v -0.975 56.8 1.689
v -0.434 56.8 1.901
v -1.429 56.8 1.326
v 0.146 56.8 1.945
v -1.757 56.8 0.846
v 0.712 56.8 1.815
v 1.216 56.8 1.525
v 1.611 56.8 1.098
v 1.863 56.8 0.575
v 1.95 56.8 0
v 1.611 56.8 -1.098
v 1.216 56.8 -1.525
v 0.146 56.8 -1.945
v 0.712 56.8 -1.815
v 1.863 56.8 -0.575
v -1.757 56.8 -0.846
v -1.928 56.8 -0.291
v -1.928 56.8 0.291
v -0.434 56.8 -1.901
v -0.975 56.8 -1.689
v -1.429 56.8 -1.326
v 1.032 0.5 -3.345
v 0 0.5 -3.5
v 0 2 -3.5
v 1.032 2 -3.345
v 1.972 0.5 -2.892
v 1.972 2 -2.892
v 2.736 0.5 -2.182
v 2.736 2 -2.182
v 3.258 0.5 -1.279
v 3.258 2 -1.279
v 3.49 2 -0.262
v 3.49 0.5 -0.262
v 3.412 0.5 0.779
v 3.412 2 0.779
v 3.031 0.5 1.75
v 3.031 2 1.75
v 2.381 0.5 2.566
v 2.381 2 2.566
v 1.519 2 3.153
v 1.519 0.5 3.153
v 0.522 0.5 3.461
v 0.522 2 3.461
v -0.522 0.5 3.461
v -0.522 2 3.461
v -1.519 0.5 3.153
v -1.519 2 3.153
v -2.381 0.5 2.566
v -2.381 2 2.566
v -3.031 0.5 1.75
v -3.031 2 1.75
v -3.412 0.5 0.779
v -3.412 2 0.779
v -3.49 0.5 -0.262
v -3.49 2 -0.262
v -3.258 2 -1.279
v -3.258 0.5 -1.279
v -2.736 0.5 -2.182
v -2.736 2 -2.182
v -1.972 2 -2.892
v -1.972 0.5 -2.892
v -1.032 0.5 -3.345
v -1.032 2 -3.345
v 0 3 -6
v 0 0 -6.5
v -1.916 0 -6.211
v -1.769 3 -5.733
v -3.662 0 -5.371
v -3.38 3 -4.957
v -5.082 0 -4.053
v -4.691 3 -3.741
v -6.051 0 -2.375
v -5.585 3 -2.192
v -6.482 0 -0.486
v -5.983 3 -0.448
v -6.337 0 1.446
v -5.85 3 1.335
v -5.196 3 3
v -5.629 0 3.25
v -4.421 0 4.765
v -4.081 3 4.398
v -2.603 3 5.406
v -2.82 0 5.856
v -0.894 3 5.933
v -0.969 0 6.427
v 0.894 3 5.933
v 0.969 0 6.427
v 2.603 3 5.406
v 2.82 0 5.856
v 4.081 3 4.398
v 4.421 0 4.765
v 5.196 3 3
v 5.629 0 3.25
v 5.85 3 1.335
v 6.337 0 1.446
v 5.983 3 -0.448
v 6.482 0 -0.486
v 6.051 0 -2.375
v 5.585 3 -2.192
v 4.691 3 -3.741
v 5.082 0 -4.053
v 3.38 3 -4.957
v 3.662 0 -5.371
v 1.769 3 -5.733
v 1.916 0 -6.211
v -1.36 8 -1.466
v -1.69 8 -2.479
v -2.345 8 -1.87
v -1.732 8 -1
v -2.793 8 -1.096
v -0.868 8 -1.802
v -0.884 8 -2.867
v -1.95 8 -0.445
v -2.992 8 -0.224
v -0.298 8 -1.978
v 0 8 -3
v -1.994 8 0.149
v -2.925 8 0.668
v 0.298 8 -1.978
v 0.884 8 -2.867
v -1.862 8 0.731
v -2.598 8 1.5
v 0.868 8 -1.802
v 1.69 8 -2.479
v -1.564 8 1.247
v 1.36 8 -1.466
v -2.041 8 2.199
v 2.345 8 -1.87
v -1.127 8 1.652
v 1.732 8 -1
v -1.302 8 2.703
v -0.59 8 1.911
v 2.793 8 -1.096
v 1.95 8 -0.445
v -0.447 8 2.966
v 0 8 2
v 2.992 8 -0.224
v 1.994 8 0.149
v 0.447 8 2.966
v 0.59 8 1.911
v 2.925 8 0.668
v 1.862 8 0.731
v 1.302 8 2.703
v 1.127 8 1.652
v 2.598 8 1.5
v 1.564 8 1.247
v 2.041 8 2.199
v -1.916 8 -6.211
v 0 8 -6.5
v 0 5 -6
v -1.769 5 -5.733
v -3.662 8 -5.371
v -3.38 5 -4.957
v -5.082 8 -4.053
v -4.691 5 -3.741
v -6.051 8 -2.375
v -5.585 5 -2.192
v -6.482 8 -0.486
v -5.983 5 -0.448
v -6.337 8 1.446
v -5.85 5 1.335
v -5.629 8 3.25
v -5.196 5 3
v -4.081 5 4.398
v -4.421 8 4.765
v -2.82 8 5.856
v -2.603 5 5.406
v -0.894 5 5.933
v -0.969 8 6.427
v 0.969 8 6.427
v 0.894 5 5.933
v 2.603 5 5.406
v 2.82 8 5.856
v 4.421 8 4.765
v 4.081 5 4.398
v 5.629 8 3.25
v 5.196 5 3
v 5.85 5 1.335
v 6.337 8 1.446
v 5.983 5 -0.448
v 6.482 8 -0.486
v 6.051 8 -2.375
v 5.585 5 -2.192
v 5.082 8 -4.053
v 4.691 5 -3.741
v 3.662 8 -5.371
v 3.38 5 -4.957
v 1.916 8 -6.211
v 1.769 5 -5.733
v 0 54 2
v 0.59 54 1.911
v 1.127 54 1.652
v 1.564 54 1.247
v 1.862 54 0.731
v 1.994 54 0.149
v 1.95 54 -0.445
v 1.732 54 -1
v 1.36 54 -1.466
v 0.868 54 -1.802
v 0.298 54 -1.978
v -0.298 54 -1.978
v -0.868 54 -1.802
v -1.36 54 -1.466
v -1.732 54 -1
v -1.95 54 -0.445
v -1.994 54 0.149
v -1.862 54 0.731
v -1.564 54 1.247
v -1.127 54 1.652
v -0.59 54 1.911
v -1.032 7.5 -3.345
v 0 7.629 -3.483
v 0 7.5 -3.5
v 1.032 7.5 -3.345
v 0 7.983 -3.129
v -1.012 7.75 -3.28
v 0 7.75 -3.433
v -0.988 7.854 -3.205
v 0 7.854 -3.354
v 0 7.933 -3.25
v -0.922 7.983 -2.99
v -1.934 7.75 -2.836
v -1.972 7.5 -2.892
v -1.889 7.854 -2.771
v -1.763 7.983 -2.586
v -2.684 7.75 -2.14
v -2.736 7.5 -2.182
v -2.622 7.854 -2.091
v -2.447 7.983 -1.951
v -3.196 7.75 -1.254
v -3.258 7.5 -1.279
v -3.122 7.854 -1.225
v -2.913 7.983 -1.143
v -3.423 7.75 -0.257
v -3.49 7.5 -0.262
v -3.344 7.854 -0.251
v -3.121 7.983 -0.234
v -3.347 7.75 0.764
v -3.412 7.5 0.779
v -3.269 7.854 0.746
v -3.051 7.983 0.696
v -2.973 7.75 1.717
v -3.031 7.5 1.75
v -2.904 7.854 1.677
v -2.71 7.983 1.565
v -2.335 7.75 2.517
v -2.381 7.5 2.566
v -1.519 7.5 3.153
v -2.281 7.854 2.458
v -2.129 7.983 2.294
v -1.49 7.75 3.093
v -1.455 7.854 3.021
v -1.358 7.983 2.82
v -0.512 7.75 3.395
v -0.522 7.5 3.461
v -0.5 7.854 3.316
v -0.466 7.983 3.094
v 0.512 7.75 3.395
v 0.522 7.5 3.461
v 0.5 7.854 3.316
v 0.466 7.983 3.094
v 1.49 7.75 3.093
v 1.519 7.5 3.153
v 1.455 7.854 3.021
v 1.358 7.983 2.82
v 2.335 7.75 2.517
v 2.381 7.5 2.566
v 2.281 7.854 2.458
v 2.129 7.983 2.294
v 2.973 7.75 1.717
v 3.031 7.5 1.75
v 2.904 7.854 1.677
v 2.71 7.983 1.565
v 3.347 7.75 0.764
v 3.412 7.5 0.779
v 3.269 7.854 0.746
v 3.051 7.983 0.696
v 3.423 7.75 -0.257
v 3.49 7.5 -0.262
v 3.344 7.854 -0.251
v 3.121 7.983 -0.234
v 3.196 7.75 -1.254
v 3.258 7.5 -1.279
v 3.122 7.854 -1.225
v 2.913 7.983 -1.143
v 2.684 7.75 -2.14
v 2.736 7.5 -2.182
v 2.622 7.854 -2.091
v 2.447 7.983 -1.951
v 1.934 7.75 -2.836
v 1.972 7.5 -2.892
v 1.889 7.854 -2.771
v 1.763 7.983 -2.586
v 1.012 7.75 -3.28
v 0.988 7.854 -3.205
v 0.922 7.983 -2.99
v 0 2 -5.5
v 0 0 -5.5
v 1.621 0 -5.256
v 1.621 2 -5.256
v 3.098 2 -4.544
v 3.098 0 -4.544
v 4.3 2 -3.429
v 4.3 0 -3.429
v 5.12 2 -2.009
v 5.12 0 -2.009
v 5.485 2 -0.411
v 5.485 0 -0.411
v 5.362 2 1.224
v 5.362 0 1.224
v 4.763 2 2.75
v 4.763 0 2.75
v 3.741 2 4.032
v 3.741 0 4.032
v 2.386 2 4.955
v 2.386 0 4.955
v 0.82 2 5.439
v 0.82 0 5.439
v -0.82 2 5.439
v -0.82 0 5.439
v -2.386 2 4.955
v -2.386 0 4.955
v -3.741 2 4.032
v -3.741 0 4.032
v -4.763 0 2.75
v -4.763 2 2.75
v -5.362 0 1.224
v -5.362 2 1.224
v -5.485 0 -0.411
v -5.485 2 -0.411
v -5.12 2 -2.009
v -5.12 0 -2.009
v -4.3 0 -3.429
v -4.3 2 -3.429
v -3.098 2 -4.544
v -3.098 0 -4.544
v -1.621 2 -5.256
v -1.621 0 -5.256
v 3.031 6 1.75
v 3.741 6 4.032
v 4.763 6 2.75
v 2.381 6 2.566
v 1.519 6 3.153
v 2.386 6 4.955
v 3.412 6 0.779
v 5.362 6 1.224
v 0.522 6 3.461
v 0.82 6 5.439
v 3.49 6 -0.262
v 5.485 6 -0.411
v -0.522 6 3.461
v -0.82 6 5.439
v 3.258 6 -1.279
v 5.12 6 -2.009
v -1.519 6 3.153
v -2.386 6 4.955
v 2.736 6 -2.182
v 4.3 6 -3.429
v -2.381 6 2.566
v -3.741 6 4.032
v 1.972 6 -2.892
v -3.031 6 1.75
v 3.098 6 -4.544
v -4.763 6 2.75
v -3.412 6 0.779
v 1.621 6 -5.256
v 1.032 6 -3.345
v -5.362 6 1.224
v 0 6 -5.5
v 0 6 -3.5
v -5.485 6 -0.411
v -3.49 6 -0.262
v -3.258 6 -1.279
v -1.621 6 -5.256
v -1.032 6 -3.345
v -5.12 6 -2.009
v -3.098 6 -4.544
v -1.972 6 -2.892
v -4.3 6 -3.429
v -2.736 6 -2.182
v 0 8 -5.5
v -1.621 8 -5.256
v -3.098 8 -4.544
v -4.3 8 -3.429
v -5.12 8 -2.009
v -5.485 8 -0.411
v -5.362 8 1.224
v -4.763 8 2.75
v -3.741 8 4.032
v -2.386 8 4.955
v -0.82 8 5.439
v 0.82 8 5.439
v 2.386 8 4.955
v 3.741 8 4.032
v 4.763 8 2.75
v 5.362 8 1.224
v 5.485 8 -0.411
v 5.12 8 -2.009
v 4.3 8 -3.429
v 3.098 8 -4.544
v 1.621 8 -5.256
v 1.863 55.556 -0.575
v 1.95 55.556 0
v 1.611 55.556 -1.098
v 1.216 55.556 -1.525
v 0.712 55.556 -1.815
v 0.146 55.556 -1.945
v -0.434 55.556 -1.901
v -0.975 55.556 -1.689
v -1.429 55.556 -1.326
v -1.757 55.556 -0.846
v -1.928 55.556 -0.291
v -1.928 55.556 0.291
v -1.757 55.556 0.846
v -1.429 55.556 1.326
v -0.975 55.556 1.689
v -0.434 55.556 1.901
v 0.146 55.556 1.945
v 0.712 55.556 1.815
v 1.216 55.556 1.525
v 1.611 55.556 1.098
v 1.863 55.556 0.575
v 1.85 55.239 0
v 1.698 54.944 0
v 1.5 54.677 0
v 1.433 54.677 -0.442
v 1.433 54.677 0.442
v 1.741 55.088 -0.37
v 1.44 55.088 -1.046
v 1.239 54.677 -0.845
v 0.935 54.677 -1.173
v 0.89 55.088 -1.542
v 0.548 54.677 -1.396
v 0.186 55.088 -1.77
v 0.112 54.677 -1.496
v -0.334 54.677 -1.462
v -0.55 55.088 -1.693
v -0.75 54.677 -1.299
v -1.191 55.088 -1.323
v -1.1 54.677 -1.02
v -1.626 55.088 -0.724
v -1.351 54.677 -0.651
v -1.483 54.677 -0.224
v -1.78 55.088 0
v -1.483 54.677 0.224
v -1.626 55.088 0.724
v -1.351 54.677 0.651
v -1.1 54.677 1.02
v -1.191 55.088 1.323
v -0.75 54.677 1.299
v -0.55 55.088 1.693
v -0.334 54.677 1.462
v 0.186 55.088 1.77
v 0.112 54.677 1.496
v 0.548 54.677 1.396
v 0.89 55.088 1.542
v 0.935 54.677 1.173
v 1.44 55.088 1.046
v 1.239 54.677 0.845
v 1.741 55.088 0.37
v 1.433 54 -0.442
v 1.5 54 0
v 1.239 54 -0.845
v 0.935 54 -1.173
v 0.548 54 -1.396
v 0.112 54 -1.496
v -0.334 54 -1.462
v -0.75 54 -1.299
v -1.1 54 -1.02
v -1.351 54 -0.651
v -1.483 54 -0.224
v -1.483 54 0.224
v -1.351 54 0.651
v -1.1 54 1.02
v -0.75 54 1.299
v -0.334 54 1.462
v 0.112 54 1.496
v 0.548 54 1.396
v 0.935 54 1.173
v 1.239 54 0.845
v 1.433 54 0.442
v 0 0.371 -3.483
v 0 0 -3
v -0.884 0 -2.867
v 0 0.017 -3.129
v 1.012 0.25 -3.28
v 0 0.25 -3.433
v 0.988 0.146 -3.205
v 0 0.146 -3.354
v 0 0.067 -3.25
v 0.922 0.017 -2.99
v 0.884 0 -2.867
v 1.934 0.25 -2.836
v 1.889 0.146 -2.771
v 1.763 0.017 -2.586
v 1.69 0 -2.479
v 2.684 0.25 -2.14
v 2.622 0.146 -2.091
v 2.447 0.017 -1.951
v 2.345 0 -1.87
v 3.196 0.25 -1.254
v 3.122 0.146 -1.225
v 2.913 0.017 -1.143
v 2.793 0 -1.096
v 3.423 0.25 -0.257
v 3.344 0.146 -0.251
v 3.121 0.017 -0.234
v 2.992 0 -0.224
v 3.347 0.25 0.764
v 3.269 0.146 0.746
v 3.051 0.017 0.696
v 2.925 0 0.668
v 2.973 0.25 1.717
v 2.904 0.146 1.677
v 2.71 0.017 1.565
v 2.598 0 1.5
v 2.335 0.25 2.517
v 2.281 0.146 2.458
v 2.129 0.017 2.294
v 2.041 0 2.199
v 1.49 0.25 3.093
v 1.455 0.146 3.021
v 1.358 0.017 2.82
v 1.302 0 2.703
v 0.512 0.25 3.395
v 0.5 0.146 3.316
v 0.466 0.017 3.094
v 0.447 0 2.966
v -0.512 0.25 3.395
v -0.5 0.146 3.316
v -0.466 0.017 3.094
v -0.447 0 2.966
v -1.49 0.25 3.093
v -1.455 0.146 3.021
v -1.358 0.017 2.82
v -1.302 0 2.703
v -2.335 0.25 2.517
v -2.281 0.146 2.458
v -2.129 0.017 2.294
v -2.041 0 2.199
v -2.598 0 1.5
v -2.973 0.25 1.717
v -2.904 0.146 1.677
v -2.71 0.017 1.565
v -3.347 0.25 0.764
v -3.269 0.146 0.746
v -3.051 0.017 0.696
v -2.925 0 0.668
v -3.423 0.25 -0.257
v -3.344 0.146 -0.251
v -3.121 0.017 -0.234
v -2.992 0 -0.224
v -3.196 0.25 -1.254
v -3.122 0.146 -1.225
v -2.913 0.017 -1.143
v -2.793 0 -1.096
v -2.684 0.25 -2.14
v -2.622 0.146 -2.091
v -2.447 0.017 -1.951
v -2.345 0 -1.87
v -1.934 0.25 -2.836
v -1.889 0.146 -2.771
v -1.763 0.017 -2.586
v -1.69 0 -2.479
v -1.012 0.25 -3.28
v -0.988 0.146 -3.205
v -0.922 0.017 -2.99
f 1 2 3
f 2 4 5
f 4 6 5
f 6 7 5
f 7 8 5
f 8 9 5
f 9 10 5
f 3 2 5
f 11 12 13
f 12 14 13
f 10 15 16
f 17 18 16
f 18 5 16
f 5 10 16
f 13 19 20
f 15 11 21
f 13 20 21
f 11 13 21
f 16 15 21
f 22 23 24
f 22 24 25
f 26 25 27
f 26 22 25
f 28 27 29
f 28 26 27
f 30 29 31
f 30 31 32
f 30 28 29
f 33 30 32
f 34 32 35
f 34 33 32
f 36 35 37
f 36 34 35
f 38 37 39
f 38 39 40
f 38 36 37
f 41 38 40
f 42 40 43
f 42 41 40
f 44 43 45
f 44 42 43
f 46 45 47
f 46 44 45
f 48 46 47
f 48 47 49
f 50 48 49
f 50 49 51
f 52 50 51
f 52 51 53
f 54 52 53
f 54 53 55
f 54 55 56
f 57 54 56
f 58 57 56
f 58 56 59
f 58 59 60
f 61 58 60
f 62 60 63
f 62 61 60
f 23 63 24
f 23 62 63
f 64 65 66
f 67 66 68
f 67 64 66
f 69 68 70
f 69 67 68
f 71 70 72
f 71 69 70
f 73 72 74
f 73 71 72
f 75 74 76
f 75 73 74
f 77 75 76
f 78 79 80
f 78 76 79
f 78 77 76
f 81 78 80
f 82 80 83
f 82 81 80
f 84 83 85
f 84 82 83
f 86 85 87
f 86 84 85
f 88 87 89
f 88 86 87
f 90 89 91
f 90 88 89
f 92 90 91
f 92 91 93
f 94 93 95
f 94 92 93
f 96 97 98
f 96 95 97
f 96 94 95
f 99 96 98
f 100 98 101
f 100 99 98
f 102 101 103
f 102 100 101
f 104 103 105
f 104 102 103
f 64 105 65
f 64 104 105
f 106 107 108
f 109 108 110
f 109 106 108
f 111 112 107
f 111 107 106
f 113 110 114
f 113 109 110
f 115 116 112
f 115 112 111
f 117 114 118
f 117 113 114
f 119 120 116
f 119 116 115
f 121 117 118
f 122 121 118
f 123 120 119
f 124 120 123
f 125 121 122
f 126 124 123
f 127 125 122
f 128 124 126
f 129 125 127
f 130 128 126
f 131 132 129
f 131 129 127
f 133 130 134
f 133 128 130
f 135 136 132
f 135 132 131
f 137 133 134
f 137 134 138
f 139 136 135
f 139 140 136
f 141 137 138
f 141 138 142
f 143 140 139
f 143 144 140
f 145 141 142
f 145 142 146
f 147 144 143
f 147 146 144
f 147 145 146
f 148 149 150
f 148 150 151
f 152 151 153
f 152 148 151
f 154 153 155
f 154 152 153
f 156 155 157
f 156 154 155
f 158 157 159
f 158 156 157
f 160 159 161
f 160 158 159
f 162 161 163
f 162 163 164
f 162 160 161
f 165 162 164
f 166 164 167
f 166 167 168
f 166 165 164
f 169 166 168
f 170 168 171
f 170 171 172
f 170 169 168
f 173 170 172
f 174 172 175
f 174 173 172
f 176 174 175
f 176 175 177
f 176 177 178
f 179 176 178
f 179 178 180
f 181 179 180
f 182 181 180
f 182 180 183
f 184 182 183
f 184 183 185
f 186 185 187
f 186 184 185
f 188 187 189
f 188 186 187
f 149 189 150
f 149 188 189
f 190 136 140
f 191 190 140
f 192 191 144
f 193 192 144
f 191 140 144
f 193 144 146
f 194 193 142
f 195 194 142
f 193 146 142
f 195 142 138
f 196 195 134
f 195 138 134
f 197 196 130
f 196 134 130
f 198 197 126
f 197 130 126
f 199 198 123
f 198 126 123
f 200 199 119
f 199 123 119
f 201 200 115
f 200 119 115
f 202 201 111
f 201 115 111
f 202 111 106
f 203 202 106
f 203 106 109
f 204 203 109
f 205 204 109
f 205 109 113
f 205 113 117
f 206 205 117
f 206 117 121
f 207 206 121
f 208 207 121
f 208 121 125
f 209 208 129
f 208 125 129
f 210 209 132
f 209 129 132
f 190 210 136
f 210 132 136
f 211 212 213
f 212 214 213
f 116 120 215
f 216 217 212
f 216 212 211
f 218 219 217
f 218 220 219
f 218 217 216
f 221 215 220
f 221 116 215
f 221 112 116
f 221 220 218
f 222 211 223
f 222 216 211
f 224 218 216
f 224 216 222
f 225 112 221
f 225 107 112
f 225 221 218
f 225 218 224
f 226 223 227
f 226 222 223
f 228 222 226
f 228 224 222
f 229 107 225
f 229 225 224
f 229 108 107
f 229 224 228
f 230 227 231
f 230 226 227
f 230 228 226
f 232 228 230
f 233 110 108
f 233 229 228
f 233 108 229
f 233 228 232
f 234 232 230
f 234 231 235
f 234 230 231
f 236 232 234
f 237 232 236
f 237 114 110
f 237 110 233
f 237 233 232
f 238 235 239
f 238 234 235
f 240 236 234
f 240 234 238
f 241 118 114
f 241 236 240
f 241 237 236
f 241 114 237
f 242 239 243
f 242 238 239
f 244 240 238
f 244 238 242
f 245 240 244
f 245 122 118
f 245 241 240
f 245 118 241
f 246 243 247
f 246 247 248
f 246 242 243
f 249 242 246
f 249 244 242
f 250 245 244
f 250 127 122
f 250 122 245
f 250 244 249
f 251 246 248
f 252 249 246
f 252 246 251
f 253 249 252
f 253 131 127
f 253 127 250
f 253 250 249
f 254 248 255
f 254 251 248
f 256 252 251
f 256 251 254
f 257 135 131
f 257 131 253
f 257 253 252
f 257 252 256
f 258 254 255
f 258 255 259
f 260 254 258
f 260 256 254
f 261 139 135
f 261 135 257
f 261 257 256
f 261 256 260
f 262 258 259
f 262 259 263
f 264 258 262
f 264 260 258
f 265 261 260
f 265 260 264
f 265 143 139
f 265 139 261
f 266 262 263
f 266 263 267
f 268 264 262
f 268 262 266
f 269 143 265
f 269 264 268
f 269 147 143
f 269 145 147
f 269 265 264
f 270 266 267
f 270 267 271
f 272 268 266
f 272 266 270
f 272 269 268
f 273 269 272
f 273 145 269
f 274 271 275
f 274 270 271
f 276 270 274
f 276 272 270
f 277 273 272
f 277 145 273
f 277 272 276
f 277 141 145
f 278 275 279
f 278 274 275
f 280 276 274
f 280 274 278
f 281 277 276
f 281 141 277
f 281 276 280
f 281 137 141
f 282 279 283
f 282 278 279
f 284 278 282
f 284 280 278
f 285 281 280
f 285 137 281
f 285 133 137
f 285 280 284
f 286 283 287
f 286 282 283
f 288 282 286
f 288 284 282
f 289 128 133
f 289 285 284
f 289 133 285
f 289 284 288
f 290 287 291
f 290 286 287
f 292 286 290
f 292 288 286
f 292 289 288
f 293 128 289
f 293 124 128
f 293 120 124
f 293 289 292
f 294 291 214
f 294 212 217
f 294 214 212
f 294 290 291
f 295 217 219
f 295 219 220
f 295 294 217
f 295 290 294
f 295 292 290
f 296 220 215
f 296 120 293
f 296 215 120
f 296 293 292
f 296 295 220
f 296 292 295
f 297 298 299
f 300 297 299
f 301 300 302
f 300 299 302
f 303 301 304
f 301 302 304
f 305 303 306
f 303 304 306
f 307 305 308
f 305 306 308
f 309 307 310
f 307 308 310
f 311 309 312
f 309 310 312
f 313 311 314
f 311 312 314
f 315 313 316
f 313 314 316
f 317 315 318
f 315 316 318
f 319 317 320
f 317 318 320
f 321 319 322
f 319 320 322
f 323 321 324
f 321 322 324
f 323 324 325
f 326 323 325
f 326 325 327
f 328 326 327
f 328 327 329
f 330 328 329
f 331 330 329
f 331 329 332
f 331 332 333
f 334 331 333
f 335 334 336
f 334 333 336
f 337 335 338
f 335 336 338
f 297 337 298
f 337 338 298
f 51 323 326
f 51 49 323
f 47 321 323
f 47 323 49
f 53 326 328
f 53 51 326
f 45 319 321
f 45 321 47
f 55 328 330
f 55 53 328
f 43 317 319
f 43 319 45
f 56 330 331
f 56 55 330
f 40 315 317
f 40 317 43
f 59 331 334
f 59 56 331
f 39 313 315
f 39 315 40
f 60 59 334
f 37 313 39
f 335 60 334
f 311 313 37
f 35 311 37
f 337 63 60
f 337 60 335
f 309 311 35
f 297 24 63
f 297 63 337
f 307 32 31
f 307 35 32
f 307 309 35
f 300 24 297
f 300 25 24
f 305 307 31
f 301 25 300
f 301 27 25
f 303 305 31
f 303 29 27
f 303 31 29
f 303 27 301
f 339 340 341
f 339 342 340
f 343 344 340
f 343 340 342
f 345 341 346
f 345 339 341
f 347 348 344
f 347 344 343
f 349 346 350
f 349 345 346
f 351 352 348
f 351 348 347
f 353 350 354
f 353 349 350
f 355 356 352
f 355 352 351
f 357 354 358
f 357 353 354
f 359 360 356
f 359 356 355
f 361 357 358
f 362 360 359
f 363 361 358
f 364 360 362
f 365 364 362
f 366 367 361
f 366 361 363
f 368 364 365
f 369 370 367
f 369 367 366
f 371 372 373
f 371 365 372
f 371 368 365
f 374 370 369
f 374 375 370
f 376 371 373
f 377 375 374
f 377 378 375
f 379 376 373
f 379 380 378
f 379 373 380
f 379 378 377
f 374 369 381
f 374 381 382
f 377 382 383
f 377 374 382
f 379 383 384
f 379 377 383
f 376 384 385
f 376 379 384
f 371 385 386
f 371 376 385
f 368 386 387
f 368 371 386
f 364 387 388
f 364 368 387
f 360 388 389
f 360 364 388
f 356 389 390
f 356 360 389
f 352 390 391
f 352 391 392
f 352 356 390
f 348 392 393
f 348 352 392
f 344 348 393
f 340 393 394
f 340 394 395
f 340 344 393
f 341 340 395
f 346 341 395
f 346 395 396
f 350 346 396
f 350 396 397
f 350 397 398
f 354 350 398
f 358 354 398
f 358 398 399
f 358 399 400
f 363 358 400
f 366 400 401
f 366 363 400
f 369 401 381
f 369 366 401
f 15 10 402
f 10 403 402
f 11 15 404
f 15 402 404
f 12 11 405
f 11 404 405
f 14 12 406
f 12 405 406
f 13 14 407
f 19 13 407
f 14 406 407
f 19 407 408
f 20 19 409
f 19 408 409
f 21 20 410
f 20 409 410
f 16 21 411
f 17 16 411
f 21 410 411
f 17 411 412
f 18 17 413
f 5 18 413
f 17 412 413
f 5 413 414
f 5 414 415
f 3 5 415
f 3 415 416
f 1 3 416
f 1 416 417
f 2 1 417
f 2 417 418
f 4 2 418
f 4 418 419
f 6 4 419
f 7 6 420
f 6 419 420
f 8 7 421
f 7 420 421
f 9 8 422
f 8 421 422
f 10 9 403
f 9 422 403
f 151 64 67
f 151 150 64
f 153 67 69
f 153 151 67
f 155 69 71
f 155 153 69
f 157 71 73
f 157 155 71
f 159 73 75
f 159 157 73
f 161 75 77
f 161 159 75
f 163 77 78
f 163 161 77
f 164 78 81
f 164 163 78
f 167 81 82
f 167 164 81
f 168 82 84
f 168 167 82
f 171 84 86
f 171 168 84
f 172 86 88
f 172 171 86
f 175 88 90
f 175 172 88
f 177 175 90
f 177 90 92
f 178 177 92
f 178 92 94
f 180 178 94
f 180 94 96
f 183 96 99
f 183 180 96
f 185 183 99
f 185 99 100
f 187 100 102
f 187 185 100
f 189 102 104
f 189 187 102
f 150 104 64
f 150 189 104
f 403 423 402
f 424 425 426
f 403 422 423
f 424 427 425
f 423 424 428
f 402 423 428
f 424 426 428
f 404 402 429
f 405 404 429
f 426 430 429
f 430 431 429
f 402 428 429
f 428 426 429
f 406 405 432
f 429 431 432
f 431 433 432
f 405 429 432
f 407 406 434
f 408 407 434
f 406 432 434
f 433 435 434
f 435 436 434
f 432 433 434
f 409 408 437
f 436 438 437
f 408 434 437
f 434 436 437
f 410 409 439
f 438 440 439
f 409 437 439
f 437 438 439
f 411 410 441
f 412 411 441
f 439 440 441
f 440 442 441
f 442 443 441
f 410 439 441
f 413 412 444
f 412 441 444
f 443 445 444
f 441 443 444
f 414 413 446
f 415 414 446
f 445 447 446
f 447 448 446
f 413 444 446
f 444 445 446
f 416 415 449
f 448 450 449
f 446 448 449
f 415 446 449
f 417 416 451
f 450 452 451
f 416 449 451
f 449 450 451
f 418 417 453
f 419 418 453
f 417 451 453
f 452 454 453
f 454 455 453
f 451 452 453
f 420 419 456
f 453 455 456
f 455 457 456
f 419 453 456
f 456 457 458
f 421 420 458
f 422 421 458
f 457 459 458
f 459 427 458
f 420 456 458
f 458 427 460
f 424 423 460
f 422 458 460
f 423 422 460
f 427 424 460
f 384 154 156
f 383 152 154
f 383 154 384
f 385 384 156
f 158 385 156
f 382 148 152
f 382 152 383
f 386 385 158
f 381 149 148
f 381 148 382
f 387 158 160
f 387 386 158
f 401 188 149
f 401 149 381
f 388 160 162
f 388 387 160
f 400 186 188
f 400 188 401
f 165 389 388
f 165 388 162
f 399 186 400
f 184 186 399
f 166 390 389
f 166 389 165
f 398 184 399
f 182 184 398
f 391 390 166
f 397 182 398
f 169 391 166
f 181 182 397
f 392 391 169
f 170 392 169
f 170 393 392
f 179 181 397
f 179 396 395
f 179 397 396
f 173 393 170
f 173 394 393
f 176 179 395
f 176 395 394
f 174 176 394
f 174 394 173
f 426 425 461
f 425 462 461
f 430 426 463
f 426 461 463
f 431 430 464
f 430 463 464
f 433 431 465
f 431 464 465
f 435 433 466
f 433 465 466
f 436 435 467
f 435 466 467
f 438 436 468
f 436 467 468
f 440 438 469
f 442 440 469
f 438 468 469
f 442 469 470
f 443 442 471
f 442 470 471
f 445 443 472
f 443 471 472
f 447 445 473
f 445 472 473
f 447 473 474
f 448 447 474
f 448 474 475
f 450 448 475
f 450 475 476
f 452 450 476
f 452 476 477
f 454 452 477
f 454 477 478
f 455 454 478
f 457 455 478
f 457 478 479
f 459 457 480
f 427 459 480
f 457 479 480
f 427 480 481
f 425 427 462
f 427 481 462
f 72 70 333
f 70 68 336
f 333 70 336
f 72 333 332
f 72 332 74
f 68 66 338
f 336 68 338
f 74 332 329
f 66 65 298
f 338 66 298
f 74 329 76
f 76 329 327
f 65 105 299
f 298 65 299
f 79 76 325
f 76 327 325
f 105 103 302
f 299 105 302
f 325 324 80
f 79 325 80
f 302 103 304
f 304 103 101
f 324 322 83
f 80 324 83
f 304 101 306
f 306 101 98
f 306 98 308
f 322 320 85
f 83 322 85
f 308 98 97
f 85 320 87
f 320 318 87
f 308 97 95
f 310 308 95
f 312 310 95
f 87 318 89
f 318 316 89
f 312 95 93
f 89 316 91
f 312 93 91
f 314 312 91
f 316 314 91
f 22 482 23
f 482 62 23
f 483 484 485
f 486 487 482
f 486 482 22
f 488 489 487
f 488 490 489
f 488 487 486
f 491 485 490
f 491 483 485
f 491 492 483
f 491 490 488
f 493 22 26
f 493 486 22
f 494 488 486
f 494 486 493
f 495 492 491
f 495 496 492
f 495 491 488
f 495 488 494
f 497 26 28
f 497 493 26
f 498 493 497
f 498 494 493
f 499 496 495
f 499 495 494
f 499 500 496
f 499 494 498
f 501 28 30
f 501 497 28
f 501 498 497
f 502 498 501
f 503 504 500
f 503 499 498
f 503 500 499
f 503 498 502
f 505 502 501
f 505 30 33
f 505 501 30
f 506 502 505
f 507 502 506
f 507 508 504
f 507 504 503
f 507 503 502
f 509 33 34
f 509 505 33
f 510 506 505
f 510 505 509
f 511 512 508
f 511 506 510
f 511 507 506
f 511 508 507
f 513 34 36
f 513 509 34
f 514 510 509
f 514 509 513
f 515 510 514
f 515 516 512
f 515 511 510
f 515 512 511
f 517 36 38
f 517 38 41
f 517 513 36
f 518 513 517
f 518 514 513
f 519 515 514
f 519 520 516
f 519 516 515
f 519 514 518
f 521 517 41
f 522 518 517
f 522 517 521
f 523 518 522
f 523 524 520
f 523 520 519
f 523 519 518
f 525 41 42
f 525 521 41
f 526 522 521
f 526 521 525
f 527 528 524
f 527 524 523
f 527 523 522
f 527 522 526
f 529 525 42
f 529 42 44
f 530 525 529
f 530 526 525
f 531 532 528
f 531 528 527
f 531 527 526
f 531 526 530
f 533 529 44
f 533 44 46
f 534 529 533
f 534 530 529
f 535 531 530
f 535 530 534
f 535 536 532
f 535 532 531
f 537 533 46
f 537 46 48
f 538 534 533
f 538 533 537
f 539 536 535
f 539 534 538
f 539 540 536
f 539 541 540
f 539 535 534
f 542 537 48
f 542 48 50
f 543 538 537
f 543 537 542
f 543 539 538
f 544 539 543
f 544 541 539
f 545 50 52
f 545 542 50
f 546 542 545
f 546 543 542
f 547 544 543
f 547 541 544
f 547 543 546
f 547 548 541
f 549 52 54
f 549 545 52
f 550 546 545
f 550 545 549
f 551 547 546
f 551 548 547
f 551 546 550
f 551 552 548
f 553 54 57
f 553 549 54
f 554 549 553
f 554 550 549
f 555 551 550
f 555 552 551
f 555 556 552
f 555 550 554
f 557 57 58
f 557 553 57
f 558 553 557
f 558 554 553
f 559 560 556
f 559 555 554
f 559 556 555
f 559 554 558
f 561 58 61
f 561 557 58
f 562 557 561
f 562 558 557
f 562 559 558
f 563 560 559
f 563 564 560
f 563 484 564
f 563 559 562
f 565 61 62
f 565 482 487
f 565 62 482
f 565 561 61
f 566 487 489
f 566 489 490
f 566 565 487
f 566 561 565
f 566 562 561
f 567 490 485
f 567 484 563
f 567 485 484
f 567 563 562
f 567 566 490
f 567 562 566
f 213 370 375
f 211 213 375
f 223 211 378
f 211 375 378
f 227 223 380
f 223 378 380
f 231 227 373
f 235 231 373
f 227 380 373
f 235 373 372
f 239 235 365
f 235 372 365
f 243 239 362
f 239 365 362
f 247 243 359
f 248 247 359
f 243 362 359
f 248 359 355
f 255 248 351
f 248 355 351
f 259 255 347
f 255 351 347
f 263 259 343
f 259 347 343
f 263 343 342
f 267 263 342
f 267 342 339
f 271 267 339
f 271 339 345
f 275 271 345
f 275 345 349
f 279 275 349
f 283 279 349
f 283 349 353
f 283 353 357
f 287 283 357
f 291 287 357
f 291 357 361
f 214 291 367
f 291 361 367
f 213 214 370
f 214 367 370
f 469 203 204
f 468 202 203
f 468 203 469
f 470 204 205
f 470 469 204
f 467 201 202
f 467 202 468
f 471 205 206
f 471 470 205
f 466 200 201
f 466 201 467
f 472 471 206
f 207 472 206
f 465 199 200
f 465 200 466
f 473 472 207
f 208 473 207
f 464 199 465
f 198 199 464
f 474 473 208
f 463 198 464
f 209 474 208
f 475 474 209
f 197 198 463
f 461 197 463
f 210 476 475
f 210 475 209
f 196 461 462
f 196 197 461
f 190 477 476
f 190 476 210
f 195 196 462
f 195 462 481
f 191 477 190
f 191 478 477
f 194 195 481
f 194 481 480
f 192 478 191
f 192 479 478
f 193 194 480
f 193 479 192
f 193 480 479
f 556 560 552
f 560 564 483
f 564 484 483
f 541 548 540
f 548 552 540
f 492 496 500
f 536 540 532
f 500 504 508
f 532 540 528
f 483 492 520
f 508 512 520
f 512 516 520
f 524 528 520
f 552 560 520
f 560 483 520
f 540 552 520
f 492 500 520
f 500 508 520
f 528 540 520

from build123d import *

# Parameters (mm, degrees)
SKETCH_1_R          = 6.5
EXTRUDE_1_DEPTH     = 8
SKETCH_2_R          = 2
EXTRUDE_2_DEPTH     = 46
SKETCH_6_R          = 5.5
SKETCH_6_R_2        = 3.5
CUT_EXTRUDE_1_DEPTH = 2
CUT_EXTRUDE_START   = -2
SKETCH_7_R          = 5.5
SKETCH_7_R_2        = 3.5
CUT_EXTRUDE_2_DEPTH = 2
FILLET_2_R          = 0.5


with BuildPart() as part:
    # 草图1 → 凸台-拉伸1 (new body)
    with BuildSketch(Plane(origin=(0, 0, 0), x_dir=(1, 0, 0), z_dir=(0, 1, 0))):
        with Locations(Location((0, 0, 0), (0, 0, 270))):
            Circle(SKETCH_1_R)
    extrude(amount=EXTRUDE_1_DEPTH)

    # 草图2 → 凸台-拉伸2 (add)
    with BuildSketch(Plane(origin=(0, 8, 0), x_dir=(1, 0, 0), z_dir=(0, 1, 0))):
        with Locations(Location((0, 0, 0), (0, 0, 270))):
            Circle(SKETCH_2_R)
    extrude(amount=EXTRUDE_2_DEPTH)

    # 草图4 → 旋转1 (revolve)
    with BuildSketch(Plane.XY):
        with BuildLine():
            Line((0, 54), (0, 56))
            Line((0, 56), (0, 56.8))
            Line((0, 56.8), (1.95, 56.8))
            Line((1.95, 56.8), (1.95, 55.555590279))
            ThreePointArc((1.95, 55.555590279), (1.780042303, 55.088161527), (1.5, 54.677124344))
            Line((1.5, 54.677124344), (1.5, 54))
            Line((1.5, 54), (0, 54))
        make_face()
    revolve(axis=Axis((0, 54, 0), (0, 1, 0)))

    # 草图5 → 切除-旋转1 (revolve, cut)
    with BuildSketch(Plane.XY, mode=Mode.PRIVATE) as cut_revolve_1_sk:
        Polygon((-6.5, 8), (-6.5, 5), (-6.5, 3), (-6.5, 0), (-6, 3), (-6, 5), align=None)
    revolve(cut_revolve_1_sk.sketch.rotate(Axis((0, 0, 0), (0, 1, 0)), 270), axis=Axis((0, 0, 0), (0, 1, 0)), mode=Mode.SUBTRACT)

    # 草图6 → 切除-拉伸1 (cut)
    with BuildSketch(Plane.XZ):
        with Locations(Location((0, 0, 0), (0, 0, 270))):
            Circle(SKETCH_6_R)
        with Locations(Location((0, 0, 0), (0, 0, 270))):
            Circle(SKETCH_6_R_2, mode=Mode.SUBTRACT)
    extrude(amount=-CUT_EXTRUDE_1_DEPTH, mode=Mode.SUBTRACT)

    # 草图7 → 切除-拉伸2 (cut)
    with BuildSketch(Plane(origin=(0, 8, 0), x_dir=(1, 0, 0), z_dir=(0, 1, 0)).offset(CUT_EXTRUDE_START)):
        with Locations(Location((0, 0, 0), (0, 0, 90))):
            Circle(SKETCH_7_R)
        with Locations(Location((0, 0, 0), (0, 0, 90))):
            Circle(SKETCH_7_R_2, mode=Mode.SUBTRACT)
    extrude(amount=CUT_EXTRUDE_2_DEPTH, mode=Mode.SUBTRACT)

    # 圆角2
    fillet_2_edges = [part.edges().sort_by_distance(p)[0] for p in [
        (0, 0, 3.5),
        (0, 8, 3.5),
    ]]
    fillet(fillet_2_edges, radius=FILLET_2_R)


solid = part.part
